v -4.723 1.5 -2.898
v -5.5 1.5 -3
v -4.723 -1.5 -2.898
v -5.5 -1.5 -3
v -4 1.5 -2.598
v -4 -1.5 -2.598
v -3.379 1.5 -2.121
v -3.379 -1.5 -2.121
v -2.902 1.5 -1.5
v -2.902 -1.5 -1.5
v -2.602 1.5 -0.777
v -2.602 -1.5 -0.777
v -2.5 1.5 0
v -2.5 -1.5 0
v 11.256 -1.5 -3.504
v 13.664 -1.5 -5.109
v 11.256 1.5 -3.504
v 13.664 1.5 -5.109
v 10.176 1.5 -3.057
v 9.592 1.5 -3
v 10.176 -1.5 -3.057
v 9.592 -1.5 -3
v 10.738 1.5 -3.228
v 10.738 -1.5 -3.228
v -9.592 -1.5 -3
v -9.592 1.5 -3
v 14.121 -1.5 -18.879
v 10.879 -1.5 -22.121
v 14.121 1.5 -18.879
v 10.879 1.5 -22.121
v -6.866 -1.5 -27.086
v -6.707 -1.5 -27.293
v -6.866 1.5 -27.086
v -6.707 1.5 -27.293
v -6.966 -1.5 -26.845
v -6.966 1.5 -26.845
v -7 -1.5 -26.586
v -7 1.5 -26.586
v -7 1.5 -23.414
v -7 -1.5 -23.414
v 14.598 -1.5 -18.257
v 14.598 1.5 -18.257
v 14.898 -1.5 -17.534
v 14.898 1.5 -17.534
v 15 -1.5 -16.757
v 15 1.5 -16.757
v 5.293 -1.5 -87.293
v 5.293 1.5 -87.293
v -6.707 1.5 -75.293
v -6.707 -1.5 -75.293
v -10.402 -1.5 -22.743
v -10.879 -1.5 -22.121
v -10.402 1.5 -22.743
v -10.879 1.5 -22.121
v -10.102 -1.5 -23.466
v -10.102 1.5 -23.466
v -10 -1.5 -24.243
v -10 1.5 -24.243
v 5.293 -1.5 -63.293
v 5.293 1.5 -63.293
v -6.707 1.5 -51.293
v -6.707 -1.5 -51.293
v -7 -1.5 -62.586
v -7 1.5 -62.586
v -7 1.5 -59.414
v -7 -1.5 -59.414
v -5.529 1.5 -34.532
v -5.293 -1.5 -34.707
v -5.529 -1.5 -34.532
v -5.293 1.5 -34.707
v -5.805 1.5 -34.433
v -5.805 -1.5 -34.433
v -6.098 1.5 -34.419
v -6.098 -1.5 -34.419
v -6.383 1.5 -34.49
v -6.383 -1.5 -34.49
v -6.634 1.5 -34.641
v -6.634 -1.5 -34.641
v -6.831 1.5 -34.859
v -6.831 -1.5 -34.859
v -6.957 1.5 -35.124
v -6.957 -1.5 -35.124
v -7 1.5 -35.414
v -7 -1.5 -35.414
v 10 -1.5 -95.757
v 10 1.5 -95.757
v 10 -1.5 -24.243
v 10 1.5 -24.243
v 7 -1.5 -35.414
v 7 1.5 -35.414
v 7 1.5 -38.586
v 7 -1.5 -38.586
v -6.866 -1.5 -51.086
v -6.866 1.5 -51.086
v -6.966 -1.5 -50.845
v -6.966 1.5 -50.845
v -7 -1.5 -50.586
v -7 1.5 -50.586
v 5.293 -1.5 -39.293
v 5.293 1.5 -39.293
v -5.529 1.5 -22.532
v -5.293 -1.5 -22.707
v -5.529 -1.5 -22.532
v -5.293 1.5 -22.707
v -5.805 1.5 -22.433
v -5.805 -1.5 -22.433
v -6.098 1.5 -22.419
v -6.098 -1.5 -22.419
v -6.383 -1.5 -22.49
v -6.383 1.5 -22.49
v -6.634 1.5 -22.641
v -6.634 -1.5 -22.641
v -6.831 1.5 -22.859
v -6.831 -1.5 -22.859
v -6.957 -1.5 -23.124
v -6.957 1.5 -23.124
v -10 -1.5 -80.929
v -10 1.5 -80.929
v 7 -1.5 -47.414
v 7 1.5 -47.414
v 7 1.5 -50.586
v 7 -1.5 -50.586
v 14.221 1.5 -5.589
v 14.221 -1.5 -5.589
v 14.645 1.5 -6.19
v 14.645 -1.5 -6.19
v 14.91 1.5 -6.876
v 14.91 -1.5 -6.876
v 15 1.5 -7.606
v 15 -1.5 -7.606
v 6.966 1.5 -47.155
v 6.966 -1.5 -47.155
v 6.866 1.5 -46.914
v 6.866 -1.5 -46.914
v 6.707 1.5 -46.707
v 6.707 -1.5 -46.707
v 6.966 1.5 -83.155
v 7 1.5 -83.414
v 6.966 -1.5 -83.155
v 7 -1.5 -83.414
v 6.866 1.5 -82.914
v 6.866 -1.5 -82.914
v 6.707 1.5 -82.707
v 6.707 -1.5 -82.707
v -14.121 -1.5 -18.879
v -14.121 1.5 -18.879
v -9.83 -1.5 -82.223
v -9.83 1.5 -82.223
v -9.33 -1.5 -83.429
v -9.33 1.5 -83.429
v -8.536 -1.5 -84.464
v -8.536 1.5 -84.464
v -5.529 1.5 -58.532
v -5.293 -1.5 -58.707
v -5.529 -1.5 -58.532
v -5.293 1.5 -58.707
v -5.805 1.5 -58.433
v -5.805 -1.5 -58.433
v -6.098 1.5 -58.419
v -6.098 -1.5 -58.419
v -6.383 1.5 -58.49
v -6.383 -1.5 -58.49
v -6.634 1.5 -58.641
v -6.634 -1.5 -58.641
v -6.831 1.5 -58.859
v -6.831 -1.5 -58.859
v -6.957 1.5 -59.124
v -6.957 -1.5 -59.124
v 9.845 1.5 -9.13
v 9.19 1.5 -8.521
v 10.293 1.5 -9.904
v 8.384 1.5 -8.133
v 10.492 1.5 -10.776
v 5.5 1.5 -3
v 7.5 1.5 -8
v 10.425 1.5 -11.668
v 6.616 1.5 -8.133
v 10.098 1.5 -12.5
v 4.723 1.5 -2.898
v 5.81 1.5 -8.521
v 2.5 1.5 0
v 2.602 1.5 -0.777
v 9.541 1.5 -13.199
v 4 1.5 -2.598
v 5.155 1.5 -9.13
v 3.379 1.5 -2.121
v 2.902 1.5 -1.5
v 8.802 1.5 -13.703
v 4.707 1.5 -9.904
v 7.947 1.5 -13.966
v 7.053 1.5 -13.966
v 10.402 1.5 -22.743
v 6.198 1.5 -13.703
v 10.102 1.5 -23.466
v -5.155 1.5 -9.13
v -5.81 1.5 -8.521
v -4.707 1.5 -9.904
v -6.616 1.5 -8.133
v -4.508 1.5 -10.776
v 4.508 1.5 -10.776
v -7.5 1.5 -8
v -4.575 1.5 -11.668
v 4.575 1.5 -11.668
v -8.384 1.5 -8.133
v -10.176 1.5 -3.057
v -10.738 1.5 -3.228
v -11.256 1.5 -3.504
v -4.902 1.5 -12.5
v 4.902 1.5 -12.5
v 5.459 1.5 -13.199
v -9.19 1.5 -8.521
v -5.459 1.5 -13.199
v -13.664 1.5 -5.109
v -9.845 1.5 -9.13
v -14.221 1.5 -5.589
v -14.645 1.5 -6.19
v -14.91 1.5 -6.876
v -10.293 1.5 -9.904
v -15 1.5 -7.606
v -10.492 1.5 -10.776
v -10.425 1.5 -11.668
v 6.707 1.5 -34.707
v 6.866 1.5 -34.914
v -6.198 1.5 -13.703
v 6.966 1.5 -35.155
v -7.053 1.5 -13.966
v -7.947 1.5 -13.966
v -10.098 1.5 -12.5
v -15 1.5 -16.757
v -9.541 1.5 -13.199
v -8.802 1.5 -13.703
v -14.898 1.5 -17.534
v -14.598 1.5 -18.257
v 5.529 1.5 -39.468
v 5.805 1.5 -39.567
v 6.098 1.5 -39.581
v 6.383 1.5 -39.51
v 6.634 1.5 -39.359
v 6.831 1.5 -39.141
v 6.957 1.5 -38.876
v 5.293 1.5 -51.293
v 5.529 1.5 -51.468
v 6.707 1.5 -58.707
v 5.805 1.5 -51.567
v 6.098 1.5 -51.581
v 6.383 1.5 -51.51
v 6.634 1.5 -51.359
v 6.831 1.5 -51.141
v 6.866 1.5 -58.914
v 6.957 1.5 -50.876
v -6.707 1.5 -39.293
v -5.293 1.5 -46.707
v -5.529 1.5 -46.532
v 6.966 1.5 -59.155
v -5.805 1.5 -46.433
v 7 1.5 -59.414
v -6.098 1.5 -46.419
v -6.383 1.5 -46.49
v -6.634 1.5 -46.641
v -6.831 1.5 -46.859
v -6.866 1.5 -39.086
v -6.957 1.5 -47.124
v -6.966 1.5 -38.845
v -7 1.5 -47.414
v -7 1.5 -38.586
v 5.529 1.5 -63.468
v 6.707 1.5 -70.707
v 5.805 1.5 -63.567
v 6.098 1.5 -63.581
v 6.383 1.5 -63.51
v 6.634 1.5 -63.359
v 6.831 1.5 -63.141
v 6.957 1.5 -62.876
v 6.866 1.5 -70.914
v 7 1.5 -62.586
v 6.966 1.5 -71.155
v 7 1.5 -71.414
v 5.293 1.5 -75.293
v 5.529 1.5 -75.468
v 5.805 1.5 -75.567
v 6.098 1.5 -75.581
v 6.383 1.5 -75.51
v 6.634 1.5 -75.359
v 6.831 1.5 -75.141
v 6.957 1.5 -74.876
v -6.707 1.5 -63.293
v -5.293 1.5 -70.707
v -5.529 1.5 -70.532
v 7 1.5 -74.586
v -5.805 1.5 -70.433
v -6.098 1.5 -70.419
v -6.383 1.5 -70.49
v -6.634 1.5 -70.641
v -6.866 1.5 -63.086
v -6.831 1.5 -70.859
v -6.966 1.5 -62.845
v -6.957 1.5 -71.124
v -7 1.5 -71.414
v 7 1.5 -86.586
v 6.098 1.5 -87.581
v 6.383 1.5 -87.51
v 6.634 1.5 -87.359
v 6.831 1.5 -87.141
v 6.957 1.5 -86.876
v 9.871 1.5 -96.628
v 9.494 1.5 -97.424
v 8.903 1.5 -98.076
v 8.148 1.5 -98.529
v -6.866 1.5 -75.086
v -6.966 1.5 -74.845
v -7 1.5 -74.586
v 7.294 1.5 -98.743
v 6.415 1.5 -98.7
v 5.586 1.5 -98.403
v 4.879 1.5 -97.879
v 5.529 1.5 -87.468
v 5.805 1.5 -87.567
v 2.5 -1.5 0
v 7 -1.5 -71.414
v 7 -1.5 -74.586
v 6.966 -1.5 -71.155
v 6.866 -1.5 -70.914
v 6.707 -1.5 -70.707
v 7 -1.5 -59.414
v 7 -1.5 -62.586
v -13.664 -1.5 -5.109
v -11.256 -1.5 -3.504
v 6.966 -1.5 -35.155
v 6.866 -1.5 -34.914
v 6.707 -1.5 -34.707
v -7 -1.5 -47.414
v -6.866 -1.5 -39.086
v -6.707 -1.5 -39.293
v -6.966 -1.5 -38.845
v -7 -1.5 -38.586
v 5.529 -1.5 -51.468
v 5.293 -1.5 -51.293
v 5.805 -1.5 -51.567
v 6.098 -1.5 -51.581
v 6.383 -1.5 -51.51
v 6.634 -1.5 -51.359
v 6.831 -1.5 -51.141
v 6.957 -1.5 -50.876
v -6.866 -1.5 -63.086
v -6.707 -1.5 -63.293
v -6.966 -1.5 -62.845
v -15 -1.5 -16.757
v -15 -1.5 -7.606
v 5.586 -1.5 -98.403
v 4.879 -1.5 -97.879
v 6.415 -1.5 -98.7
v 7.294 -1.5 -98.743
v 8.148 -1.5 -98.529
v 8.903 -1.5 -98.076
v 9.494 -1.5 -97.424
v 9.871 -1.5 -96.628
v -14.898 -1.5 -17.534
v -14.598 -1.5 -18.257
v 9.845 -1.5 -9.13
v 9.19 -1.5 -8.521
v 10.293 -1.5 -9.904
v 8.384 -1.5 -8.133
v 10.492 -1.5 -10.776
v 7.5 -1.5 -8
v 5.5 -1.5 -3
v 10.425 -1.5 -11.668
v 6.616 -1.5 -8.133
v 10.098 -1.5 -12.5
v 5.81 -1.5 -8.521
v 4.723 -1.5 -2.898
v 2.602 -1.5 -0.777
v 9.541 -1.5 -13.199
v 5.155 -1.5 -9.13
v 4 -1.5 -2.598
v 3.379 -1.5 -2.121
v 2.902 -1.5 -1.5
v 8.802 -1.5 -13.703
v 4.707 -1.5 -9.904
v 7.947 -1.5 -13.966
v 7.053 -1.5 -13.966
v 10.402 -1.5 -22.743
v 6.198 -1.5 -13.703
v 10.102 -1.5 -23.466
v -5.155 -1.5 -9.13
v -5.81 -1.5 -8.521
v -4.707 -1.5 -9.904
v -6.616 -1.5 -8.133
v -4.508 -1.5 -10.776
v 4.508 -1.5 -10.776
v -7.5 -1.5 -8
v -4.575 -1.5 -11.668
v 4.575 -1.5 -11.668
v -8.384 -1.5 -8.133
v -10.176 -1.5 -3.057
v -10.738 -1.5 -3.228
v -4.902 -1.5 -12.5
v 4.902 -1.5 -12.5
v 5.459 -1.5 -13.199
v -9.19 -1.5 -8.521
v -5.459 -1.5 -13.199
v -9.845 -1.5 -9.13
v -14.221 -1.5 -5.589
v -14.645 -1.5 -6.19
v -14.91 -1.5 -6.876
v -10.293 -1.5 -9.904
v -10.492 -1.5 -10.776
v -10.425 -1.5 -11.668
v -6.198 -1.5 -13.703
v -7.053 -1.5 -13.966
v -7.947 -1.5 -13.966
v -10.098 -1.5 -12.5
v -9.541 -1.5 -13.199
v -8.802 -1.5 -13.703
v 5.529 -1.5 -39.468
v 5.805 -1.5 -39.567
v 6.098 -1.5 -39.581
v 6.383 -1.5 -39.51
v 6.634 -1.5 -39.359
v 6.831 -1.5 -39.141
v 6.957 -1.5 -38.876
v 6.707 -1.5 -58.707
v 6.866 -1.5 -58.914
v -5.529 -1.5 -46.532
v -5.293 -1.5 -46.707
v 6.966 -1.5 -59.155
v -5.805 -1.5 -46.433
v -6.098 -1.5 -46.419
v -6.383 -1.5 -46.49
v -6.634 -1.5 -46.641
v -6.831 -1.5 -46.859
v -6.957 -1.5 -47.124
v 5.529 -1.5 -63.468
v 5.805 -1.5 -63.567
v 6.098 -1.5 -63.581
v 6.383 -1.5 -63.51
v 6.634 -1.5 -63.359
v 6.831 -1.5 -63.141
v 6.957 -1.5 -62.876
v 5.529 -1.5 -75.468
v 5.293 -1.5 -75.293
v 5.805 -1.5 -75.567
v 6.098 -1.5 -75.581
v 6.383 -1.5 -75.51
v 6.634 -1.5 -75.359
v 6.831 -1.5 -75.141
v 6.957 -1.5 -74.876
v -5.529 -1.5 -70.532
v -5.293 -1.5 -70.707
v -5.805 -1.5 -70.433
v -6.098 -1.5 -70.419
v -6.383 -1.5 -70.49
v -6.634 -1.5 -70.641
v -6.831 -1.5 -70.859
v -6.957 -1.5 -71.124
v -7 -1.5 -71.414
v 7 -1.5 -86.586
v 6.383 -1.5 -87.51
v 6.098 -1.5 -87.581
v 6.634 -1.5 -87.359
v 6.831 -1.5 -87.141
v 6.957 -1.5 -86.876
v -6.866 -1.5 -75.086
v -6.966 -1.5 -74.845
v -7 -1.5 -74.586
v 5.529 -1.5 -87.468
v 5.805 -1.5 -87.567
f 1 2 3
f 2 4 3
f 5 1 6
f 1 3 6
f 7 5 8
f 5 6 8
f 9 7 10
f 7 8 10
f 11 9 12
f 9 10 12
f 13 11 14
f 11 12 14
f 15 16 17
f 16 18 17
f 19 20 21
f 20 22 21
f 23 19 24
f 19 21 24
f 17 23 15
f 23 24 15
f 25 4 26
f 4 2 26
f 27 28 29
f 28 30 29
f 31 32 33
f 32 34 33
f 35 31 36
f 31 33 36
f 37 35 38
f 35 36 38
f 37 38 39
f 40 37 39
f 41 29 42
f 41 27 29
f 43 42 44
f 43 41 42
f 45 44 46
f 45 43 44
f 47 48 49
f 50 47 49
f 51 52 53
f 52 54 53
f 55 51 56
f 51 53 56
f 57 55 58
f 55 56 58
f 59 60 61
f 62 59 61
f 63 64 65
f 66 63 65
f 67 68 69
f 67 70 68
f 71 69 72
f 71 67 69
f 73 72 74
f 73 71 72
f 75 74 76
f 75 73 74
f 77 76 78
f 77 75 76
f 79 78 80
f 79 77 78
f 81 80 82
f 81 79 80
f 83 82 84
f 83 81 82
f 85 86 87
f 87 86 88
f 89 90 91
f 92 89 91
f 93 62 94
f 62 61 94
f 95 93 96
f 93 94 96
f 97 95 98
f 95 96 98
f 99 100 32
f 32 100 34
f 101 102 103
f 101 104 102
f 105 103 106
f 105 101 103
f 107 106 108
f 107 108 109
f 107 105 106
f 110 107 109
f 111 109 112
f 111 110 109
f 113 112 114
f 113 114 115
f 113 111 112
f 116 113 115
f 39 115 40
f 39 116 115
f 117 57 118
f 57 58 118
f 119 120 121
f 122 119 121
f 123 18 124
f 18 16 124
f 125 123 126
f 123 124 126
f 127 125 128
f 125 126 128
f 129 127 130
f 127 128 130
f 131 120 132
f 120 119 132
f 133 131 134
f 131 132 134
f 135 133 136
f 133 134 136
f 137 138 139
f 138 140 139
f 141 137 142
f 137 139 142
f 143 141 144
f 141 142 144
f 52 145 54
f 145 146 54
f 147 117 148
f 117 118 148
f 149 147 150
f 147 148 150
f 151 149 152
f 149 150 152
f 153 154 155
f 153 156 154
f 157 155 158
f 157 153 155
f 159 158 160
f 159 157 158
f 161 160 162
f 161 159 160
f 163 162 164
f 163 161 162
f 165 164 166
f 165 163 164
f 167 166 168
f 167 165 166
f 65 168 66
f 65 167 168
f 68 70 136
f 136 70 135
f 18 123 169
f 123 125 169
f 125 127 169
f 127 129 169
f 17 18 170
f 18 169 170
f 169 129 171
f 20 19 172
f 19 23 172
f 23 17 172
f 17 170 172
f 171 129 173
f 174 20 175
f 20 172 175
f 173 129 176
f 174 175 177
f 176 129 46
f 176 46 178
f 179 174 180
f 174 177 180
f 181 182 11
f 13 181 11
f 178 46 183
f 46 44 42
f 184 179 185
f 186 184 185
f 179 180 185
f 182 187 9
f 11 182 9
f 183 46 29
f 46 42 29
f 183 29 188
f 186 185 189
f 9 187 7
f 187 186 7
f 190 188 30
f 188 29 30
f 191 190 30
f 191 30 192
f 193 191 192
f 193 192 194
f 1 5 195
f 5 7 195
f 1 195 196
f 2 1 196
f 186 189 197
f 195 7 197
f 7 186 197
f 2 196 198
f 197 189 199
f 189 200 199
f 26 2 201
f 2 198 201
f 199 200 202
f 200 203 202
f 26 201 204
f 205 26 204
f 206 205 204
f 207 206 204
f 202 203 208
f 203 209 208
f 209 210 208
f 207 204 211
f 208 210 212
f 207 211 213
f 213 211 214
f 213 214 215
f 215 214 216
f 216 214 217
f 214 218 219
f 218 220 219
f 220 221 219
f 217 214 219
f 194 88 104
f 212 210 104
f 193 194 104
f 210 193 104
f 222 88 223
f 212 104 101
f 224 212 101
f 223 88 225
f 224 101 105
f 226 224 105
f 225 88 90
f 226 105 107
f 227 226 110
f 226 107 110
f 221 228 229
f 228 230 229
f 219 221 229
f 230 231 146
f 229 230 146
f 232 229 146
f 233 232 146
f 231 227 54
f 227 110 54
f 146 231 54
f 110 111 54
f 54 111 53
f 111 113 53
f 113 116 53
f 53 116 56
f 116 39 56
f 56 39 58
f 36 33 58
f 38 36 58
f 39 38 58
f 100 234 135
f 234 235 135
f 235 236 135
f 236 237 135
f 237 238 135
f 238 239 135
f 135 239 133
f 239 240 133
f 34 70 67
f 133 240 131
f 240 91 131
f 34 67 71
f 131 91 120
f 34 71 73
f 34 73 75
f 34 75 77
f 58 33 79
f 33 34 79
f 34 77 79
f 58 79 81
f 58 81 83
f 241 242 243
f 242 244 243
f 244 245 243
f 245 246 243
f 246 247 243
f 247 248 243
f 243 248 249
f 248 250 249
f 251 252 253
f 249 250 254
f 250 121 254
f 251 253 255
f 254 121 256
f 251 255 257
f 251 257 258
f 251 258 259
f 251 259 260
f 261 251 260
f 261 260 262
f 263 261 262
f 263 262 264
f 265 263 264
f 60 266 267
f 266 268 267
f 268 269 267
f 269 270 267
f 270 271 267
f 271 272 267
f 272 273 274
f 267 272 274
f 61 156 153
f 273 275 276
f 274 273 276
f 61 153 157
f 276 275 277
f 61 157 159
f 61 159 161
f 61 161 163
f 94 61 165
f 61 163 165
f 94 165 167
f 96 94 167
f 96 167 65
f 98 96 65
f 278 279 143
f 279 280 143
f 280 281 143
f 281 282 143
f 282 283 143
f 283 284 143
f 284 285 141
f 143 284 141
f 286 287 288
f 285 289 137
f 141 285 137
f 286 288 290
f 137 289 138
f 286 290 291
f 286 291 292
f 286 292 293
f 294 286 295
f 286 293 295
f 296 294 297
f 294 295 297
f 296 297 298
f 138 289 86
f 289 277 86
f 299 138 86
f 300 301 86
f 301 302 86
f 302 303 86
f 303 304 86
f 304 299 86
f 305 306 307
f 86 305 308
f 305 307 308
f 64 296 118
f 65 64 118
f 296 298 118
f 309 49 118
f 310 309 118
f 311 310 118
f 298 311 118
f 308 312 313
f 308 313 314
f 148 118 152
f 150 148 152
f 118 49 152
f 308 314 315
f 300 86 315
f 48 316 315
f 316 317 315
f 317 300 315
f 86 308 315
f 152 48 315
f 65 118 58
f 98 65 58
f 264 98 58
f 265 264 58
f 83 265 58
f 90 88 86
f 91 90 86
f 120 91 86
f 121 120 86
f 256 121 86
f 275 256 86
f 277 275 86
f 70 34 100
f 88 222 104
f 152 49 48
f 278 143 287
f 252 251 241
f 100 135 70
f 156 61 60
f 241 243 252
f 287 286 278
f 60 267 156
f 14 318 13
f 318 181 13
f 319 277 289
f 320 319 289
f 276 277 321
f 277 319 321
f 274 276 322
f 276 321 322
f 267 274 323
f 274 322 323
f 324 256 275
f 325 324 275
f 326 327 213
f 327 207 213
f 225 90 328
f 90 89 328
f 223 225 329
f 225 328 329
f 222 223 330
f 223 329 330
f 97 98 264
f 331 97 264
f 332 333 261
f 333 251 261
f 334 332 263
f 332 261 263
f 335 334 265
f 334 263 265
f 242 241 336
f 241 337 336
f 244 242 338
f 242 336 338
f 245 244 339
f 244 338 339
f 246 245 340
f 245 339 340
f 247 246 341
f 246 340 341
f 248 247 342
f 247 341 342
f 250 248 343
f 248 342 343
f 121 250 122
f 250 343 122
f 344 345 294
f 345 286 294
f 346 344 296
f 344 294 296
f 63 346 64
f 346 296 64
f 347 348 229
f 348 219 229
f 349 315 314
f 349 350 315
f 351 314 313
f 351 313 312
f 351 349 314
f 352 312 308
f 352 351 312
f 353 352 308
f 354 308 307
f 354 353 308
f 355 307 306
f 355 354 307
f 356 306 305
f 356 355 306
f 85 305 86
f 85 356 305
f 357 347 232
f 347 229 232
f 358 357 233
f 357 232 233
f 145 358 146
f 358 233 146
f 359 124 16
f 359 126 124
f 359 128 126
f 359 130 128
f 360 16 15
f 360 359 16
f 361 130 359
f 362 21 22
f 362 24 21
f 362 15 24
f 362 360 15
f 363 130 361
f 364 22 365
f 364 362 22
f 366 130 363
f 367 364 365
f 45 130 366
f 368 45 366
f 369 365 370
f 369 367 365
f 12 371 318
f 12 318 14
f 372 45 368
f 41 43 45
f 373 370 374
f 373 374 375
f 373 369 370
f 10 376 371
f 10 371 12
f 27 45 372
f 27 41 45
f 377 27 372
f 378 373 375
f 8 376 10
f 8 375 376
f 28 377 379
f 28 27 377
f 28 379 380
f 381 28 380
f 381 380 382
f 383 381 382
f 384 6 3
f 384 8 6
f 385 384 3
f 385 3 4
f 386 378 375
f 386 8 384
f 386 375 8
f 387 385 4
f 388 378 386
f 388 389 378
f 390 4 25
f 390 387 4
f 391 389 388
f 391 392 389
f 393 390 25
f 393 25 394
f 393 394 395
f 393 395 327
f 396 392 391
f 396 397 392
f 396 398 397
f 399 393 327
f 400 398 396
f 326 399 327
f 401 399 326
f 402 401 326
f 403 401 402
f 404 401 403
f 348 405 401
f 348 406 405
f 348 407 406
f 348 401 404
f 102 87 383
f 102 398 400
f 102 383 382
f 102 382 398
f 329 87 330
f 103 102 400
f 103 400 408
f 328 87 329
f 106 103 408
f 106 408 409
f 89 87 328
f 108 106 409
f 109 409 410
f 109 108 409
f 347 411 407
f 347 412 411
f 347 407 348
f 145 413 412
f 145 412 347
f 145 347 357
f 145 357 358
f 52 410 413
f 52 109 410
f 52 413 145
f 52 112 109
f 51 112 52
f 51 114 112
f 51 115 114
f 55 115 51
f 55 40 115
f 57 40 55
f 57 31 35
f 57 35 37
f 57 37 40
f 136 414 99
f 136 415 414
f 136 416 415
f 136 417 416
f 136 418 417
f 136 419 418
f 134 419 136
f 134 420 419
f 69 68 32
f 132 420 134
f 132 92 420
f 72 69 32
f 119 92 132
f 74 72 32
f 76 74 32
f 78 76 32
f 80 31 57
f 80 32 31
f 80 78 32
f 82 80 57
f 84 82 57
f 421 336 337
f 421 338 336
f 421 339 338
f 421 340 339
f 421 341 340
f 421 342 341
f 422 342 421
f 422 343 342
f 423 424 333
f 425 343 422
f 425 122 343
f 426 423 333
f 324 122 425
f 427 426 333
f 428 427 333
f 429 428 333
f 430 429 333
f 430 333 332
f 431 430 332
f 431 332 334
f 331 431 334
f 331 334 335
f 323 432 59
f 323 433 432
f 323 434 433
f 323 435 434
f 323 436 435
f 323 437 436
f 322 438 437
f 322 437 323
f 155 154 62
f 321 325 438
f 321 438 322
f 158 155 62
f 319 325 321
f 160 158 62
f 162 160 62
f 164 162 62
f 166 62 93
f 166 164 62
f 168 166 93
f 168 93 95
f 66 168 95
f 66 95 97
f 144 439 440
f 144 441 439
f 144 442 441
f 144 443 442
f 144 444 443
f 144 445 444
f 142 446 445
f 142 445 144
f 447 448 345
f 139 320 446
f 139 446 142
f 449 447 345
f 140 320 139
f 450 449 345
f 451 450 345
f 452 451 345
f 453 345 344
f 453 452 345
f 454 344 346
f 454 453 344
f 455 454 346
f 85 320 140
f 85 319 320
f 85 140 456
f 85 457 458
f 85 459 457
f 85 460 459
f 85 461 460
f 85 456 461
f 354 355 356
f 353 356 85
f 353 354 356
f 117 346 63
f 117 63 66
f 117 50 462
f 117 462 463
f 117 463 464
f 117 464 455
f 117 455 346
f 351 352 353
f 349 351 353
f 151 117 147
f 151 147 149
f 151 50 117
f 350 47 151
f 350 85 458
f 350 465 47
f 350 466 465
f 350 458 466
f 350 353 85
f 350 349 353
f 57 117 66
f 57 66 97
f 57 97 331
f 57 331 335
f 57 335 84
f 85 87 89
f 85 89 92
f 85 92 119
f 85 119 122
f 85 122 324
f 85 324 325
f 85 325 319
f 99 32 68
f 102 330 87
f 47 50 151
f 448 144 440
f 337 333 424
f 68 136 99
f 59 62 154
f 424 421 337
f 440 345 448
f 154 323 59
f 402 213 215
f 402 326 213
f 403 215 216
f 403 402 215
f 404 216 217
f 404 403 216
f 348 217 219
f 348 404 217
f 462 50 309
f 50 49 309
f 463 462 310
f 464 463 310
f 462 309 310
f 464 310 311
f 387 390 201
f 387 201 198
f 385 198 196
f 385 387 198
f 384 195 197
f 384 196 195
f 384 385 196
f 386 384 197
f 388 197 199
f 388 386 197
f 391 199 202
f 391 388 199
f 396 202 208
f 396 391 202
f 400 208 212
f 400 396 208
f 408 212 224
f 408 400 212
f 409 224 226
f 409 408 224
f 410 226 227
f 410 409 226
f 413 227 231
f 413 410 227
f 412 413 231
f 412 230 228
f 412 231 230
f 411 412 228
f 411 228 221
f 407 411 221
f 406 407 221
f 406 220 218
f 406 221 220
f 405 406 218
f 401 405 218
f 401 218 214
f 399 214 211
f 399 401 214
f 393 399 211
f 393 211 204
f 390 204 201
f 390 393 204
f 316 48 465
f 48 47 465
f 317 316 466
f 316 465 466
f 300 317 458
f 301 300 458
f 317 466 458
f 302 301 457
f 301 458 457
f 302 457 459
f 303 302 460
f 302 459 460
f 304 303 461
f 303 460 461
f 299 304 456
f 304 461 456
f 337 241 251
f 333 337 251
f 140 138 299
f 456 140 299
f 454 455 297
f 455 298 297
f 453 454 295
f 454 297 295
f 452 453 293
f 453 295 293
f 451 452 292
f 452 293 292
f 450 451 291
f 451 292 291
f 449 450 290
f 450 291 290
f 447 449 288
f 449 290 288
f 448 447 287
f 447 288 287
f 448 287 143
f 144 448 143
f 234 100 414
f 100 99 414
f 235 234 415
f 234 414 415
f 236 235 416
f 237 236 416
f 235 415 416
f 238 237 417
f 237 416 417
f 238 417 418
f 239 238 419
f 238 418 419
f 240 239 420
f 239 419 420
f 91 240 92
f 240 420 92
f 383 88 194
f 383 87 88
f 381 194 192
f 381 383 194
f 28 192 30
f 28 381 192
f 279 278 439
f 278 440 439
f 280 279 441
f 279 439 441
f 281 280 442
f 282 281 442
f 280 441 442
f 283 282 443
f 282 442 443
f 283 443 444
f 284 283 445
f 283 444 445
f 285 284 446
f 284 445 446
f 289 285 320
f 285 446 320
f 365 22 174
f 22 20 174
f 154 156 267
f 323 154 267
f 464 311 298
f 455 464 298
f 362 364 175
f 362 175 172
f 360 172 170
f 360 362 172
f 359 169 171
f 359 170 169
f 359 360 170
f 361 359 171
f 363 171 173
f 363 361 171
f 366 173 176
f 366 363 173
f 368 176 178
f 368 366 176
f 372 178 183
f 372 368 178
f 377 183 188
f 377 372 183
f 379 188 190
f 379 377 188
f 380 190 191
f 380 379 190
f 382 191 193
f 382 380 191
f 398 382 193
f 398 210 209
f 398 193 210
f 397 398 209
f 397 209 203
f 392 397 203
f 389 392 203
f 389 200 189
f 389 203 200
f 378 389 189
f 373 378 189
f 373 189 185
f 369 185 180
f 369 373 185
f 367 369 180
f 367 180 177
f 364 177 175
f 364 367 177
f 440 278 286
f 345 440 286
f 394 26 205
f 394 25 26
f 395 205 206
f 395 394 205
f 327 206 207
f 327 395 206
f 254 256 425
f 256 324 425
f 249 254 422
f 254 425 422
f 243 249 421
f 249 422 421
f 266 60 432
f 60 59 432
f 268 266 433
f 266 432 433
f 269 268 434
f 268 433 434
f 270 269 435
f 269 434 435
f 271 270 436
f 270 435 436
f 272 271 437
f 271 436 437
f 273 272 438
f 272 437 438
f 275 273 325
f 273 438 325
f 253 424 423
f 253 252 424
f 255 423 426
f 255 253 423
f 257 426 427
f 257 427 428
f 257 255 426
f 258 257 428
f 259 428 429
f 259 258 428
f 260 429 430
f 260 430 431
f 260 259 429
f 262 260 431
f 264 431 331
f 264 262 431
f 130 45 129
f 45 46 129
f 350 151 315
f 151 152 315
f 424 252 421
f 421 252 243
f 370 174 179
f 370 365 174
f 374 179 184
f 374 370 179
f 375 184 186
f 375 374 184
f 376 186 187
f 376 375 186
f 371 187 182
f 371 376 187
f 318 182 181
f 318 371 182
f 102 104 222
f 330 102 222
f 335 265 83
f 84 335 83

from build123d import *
from OCP.BRepFilletAPI import BRepFilletAPI_MakeFillet

# Parameters (mm, degrees)
BOSS_EXTRUDE1_DEPTH     = 1.5
CUT_EXTRUDE1_DEPTH      = 105.097310244
CUT_EXTRUDE2_DEPTH      = 105.097310244
CUT_EXTRUDE2_DEPTH_BACK = 105.097310244
SKETCH2_R               = 3
FILLET1_R               = 3
FILLET2_R               = 3
FILLET3_R1              = 5
FILLET3_R2              = 3
FILLET4_R               = 1
LPATTERN1_COUNT         = 5
LPATTERN1_PITCH         = 12
FILLET4_OF_LPATTERN1_R  = 1


with BuildPart() as part:
    # Sketch1 → Boss-Extrude1 (new, symmetric)
    with BuildSketch(Plane(origin=(0, 0, 0), x_dir=(1, 0, 0), z_dir=(0, 1, 0))):
        Polygon((-10, 83), (10, 103), (10, 23), (15, 18), (15, 6), (10.5, 3), (2.5, 3), (2.5, 0), (-2.5, 0), (-2.5, 3), (-10.5, 3), (-15, 6), (-15, 18), (-10, 23), align=None)
    extrude(amount=BOSS_EXTRUDE1_DEPTH, both=True)

    # Sketch1<3> → Cut-Extrude1 (cut, symmetric)
    with BuildSketch(Plane(origin=(0, 0, 0), x_dir=(1, 0, 0), z_dir=(0, 1, 0))):
        Polygon((7, 89), (-7, 75), (-7, 69), (7, 83), align=None)
    cut_extrude1 = extrude(amount=CUT_EXTRUDE1_DEPTH, both=True, mode=Mode.SUBTRACT)

    # Sketch2 → Cut-Extrude2 (cut, two sides: drawn at the far end of the back side and taken through both)
    with BuildSketch(Plane(origin=(0, 0, 0), x_dir=(1, 0, 0), z_dir=(0, 1, 0)).offset(-CUT_EXTRUDE2_DEPTH_BACK)):
        with Locations(Location((-7.5, 11, 0), (0, 0, 270))):
            Circle(SKETCH2_R)
        with Locations(Location((7.5, 11, 0), (0, 0, 270))):
            Circle(SKETCH2_R)
    extrude(amount=CUT_EXTRUDE2_DEPTH + CUT_EXTRUDE2_DEPTH_BACK, mode=Mode.SUBTRACT)

    # Fillet1
    fillet1_edges = [part.edges().sort_by_distance(p)[0] for p in [
        (2.5, 0, -3),
        (-2.5, 0, -3),
    ]]
    fillet(fillet1_edges, radius=FILLET1_R - 0.0001)  # a hair under: the kernel refuses the full size

    # Fillet2
    fillet2_edges = [part.edges().sort_by_distance(p)[0] for p in [
        (-10, 0, -23),
        (-15, 0, -18),
        (-15, 0, -6),
        (-10.5, 0, -3),
        (10.5, 0, -3),
        (15, 0, -6),
        (15, 0, -18),
        (10, 0, -23),
    ]]
    fillet(fillet2_edges, radius=FILLET2_R)

    # Fillet3: one fillet with a radius per group of edges: ONE call of the kernel's fillet builder (fillet() takes one radius for all edges)
    fillet3_edges_1 = [part.edges().sort_by_distance(p)[0] for p in [
        (-10, 0, -83),
    ]]
    fillet3_edges_2 = [part.edges().sort_by_distance(p)[0] for p in [
        (10, 0, -103),
    ]]
    fillet3 = BRepFilletAPI_MakeFillet(part.part.solid().wrapped)
    for e in fillet3_edges_1:
        fillet3.Add(FILLET3_R1, e.wrapped)
    for e in fillet3_edges_2:
        fillet3.Add(FILLET3_R2, e.wrapped)
    add(Compound.cast(fillet3.Shape()), mode=Mode.REPLACE)

    # Fillet4
    fillet4_edges = [part.edges().sort_by_distance(p)[0] for p in [
        (-7, 0, -69),
        (-7, 0, -75),
        (7, 0, -89),
        (7, 0, -83),
    ]]
    fillet(fillet4_edges, radius=FILLET4_R)

    # LPattern1: Cut-Extrude1 ×5
    with Locations(*[(0, 0, i * LPATTERN1_PITCH) for i in range(1, LPATTERN1_COUNT)]):
        add(cut_extrude1, mode=Mode.SUBTRACT)

    # Fillet4 of LPattern1
    fillet4_of_lpattern1_edges = [part.edges().sort_by_distance(p)[0] for p in [
        (-7, 0, -57),
        (-7, 0, -63),
        (7, 0, -77),
        (7, 0, -71),
        (-7, 0, -45),
        (-7, 0, -51),
        (7, 0, -65),
        (7, 0, -59),
        (-7, 0, -33),
        (-7, 0, -39),
        (7, 0, -53),
        (7, 0, -47),
        (-7, 0, -21),
        (-7, 0, -27),
        (7, 0, -41),
        (7, 0, -35),
    ]]
    fillet(fillet4_of_lpattern1_edges, radius=FILLET4_OF_LPATTERN1_R)


solid = part.part
